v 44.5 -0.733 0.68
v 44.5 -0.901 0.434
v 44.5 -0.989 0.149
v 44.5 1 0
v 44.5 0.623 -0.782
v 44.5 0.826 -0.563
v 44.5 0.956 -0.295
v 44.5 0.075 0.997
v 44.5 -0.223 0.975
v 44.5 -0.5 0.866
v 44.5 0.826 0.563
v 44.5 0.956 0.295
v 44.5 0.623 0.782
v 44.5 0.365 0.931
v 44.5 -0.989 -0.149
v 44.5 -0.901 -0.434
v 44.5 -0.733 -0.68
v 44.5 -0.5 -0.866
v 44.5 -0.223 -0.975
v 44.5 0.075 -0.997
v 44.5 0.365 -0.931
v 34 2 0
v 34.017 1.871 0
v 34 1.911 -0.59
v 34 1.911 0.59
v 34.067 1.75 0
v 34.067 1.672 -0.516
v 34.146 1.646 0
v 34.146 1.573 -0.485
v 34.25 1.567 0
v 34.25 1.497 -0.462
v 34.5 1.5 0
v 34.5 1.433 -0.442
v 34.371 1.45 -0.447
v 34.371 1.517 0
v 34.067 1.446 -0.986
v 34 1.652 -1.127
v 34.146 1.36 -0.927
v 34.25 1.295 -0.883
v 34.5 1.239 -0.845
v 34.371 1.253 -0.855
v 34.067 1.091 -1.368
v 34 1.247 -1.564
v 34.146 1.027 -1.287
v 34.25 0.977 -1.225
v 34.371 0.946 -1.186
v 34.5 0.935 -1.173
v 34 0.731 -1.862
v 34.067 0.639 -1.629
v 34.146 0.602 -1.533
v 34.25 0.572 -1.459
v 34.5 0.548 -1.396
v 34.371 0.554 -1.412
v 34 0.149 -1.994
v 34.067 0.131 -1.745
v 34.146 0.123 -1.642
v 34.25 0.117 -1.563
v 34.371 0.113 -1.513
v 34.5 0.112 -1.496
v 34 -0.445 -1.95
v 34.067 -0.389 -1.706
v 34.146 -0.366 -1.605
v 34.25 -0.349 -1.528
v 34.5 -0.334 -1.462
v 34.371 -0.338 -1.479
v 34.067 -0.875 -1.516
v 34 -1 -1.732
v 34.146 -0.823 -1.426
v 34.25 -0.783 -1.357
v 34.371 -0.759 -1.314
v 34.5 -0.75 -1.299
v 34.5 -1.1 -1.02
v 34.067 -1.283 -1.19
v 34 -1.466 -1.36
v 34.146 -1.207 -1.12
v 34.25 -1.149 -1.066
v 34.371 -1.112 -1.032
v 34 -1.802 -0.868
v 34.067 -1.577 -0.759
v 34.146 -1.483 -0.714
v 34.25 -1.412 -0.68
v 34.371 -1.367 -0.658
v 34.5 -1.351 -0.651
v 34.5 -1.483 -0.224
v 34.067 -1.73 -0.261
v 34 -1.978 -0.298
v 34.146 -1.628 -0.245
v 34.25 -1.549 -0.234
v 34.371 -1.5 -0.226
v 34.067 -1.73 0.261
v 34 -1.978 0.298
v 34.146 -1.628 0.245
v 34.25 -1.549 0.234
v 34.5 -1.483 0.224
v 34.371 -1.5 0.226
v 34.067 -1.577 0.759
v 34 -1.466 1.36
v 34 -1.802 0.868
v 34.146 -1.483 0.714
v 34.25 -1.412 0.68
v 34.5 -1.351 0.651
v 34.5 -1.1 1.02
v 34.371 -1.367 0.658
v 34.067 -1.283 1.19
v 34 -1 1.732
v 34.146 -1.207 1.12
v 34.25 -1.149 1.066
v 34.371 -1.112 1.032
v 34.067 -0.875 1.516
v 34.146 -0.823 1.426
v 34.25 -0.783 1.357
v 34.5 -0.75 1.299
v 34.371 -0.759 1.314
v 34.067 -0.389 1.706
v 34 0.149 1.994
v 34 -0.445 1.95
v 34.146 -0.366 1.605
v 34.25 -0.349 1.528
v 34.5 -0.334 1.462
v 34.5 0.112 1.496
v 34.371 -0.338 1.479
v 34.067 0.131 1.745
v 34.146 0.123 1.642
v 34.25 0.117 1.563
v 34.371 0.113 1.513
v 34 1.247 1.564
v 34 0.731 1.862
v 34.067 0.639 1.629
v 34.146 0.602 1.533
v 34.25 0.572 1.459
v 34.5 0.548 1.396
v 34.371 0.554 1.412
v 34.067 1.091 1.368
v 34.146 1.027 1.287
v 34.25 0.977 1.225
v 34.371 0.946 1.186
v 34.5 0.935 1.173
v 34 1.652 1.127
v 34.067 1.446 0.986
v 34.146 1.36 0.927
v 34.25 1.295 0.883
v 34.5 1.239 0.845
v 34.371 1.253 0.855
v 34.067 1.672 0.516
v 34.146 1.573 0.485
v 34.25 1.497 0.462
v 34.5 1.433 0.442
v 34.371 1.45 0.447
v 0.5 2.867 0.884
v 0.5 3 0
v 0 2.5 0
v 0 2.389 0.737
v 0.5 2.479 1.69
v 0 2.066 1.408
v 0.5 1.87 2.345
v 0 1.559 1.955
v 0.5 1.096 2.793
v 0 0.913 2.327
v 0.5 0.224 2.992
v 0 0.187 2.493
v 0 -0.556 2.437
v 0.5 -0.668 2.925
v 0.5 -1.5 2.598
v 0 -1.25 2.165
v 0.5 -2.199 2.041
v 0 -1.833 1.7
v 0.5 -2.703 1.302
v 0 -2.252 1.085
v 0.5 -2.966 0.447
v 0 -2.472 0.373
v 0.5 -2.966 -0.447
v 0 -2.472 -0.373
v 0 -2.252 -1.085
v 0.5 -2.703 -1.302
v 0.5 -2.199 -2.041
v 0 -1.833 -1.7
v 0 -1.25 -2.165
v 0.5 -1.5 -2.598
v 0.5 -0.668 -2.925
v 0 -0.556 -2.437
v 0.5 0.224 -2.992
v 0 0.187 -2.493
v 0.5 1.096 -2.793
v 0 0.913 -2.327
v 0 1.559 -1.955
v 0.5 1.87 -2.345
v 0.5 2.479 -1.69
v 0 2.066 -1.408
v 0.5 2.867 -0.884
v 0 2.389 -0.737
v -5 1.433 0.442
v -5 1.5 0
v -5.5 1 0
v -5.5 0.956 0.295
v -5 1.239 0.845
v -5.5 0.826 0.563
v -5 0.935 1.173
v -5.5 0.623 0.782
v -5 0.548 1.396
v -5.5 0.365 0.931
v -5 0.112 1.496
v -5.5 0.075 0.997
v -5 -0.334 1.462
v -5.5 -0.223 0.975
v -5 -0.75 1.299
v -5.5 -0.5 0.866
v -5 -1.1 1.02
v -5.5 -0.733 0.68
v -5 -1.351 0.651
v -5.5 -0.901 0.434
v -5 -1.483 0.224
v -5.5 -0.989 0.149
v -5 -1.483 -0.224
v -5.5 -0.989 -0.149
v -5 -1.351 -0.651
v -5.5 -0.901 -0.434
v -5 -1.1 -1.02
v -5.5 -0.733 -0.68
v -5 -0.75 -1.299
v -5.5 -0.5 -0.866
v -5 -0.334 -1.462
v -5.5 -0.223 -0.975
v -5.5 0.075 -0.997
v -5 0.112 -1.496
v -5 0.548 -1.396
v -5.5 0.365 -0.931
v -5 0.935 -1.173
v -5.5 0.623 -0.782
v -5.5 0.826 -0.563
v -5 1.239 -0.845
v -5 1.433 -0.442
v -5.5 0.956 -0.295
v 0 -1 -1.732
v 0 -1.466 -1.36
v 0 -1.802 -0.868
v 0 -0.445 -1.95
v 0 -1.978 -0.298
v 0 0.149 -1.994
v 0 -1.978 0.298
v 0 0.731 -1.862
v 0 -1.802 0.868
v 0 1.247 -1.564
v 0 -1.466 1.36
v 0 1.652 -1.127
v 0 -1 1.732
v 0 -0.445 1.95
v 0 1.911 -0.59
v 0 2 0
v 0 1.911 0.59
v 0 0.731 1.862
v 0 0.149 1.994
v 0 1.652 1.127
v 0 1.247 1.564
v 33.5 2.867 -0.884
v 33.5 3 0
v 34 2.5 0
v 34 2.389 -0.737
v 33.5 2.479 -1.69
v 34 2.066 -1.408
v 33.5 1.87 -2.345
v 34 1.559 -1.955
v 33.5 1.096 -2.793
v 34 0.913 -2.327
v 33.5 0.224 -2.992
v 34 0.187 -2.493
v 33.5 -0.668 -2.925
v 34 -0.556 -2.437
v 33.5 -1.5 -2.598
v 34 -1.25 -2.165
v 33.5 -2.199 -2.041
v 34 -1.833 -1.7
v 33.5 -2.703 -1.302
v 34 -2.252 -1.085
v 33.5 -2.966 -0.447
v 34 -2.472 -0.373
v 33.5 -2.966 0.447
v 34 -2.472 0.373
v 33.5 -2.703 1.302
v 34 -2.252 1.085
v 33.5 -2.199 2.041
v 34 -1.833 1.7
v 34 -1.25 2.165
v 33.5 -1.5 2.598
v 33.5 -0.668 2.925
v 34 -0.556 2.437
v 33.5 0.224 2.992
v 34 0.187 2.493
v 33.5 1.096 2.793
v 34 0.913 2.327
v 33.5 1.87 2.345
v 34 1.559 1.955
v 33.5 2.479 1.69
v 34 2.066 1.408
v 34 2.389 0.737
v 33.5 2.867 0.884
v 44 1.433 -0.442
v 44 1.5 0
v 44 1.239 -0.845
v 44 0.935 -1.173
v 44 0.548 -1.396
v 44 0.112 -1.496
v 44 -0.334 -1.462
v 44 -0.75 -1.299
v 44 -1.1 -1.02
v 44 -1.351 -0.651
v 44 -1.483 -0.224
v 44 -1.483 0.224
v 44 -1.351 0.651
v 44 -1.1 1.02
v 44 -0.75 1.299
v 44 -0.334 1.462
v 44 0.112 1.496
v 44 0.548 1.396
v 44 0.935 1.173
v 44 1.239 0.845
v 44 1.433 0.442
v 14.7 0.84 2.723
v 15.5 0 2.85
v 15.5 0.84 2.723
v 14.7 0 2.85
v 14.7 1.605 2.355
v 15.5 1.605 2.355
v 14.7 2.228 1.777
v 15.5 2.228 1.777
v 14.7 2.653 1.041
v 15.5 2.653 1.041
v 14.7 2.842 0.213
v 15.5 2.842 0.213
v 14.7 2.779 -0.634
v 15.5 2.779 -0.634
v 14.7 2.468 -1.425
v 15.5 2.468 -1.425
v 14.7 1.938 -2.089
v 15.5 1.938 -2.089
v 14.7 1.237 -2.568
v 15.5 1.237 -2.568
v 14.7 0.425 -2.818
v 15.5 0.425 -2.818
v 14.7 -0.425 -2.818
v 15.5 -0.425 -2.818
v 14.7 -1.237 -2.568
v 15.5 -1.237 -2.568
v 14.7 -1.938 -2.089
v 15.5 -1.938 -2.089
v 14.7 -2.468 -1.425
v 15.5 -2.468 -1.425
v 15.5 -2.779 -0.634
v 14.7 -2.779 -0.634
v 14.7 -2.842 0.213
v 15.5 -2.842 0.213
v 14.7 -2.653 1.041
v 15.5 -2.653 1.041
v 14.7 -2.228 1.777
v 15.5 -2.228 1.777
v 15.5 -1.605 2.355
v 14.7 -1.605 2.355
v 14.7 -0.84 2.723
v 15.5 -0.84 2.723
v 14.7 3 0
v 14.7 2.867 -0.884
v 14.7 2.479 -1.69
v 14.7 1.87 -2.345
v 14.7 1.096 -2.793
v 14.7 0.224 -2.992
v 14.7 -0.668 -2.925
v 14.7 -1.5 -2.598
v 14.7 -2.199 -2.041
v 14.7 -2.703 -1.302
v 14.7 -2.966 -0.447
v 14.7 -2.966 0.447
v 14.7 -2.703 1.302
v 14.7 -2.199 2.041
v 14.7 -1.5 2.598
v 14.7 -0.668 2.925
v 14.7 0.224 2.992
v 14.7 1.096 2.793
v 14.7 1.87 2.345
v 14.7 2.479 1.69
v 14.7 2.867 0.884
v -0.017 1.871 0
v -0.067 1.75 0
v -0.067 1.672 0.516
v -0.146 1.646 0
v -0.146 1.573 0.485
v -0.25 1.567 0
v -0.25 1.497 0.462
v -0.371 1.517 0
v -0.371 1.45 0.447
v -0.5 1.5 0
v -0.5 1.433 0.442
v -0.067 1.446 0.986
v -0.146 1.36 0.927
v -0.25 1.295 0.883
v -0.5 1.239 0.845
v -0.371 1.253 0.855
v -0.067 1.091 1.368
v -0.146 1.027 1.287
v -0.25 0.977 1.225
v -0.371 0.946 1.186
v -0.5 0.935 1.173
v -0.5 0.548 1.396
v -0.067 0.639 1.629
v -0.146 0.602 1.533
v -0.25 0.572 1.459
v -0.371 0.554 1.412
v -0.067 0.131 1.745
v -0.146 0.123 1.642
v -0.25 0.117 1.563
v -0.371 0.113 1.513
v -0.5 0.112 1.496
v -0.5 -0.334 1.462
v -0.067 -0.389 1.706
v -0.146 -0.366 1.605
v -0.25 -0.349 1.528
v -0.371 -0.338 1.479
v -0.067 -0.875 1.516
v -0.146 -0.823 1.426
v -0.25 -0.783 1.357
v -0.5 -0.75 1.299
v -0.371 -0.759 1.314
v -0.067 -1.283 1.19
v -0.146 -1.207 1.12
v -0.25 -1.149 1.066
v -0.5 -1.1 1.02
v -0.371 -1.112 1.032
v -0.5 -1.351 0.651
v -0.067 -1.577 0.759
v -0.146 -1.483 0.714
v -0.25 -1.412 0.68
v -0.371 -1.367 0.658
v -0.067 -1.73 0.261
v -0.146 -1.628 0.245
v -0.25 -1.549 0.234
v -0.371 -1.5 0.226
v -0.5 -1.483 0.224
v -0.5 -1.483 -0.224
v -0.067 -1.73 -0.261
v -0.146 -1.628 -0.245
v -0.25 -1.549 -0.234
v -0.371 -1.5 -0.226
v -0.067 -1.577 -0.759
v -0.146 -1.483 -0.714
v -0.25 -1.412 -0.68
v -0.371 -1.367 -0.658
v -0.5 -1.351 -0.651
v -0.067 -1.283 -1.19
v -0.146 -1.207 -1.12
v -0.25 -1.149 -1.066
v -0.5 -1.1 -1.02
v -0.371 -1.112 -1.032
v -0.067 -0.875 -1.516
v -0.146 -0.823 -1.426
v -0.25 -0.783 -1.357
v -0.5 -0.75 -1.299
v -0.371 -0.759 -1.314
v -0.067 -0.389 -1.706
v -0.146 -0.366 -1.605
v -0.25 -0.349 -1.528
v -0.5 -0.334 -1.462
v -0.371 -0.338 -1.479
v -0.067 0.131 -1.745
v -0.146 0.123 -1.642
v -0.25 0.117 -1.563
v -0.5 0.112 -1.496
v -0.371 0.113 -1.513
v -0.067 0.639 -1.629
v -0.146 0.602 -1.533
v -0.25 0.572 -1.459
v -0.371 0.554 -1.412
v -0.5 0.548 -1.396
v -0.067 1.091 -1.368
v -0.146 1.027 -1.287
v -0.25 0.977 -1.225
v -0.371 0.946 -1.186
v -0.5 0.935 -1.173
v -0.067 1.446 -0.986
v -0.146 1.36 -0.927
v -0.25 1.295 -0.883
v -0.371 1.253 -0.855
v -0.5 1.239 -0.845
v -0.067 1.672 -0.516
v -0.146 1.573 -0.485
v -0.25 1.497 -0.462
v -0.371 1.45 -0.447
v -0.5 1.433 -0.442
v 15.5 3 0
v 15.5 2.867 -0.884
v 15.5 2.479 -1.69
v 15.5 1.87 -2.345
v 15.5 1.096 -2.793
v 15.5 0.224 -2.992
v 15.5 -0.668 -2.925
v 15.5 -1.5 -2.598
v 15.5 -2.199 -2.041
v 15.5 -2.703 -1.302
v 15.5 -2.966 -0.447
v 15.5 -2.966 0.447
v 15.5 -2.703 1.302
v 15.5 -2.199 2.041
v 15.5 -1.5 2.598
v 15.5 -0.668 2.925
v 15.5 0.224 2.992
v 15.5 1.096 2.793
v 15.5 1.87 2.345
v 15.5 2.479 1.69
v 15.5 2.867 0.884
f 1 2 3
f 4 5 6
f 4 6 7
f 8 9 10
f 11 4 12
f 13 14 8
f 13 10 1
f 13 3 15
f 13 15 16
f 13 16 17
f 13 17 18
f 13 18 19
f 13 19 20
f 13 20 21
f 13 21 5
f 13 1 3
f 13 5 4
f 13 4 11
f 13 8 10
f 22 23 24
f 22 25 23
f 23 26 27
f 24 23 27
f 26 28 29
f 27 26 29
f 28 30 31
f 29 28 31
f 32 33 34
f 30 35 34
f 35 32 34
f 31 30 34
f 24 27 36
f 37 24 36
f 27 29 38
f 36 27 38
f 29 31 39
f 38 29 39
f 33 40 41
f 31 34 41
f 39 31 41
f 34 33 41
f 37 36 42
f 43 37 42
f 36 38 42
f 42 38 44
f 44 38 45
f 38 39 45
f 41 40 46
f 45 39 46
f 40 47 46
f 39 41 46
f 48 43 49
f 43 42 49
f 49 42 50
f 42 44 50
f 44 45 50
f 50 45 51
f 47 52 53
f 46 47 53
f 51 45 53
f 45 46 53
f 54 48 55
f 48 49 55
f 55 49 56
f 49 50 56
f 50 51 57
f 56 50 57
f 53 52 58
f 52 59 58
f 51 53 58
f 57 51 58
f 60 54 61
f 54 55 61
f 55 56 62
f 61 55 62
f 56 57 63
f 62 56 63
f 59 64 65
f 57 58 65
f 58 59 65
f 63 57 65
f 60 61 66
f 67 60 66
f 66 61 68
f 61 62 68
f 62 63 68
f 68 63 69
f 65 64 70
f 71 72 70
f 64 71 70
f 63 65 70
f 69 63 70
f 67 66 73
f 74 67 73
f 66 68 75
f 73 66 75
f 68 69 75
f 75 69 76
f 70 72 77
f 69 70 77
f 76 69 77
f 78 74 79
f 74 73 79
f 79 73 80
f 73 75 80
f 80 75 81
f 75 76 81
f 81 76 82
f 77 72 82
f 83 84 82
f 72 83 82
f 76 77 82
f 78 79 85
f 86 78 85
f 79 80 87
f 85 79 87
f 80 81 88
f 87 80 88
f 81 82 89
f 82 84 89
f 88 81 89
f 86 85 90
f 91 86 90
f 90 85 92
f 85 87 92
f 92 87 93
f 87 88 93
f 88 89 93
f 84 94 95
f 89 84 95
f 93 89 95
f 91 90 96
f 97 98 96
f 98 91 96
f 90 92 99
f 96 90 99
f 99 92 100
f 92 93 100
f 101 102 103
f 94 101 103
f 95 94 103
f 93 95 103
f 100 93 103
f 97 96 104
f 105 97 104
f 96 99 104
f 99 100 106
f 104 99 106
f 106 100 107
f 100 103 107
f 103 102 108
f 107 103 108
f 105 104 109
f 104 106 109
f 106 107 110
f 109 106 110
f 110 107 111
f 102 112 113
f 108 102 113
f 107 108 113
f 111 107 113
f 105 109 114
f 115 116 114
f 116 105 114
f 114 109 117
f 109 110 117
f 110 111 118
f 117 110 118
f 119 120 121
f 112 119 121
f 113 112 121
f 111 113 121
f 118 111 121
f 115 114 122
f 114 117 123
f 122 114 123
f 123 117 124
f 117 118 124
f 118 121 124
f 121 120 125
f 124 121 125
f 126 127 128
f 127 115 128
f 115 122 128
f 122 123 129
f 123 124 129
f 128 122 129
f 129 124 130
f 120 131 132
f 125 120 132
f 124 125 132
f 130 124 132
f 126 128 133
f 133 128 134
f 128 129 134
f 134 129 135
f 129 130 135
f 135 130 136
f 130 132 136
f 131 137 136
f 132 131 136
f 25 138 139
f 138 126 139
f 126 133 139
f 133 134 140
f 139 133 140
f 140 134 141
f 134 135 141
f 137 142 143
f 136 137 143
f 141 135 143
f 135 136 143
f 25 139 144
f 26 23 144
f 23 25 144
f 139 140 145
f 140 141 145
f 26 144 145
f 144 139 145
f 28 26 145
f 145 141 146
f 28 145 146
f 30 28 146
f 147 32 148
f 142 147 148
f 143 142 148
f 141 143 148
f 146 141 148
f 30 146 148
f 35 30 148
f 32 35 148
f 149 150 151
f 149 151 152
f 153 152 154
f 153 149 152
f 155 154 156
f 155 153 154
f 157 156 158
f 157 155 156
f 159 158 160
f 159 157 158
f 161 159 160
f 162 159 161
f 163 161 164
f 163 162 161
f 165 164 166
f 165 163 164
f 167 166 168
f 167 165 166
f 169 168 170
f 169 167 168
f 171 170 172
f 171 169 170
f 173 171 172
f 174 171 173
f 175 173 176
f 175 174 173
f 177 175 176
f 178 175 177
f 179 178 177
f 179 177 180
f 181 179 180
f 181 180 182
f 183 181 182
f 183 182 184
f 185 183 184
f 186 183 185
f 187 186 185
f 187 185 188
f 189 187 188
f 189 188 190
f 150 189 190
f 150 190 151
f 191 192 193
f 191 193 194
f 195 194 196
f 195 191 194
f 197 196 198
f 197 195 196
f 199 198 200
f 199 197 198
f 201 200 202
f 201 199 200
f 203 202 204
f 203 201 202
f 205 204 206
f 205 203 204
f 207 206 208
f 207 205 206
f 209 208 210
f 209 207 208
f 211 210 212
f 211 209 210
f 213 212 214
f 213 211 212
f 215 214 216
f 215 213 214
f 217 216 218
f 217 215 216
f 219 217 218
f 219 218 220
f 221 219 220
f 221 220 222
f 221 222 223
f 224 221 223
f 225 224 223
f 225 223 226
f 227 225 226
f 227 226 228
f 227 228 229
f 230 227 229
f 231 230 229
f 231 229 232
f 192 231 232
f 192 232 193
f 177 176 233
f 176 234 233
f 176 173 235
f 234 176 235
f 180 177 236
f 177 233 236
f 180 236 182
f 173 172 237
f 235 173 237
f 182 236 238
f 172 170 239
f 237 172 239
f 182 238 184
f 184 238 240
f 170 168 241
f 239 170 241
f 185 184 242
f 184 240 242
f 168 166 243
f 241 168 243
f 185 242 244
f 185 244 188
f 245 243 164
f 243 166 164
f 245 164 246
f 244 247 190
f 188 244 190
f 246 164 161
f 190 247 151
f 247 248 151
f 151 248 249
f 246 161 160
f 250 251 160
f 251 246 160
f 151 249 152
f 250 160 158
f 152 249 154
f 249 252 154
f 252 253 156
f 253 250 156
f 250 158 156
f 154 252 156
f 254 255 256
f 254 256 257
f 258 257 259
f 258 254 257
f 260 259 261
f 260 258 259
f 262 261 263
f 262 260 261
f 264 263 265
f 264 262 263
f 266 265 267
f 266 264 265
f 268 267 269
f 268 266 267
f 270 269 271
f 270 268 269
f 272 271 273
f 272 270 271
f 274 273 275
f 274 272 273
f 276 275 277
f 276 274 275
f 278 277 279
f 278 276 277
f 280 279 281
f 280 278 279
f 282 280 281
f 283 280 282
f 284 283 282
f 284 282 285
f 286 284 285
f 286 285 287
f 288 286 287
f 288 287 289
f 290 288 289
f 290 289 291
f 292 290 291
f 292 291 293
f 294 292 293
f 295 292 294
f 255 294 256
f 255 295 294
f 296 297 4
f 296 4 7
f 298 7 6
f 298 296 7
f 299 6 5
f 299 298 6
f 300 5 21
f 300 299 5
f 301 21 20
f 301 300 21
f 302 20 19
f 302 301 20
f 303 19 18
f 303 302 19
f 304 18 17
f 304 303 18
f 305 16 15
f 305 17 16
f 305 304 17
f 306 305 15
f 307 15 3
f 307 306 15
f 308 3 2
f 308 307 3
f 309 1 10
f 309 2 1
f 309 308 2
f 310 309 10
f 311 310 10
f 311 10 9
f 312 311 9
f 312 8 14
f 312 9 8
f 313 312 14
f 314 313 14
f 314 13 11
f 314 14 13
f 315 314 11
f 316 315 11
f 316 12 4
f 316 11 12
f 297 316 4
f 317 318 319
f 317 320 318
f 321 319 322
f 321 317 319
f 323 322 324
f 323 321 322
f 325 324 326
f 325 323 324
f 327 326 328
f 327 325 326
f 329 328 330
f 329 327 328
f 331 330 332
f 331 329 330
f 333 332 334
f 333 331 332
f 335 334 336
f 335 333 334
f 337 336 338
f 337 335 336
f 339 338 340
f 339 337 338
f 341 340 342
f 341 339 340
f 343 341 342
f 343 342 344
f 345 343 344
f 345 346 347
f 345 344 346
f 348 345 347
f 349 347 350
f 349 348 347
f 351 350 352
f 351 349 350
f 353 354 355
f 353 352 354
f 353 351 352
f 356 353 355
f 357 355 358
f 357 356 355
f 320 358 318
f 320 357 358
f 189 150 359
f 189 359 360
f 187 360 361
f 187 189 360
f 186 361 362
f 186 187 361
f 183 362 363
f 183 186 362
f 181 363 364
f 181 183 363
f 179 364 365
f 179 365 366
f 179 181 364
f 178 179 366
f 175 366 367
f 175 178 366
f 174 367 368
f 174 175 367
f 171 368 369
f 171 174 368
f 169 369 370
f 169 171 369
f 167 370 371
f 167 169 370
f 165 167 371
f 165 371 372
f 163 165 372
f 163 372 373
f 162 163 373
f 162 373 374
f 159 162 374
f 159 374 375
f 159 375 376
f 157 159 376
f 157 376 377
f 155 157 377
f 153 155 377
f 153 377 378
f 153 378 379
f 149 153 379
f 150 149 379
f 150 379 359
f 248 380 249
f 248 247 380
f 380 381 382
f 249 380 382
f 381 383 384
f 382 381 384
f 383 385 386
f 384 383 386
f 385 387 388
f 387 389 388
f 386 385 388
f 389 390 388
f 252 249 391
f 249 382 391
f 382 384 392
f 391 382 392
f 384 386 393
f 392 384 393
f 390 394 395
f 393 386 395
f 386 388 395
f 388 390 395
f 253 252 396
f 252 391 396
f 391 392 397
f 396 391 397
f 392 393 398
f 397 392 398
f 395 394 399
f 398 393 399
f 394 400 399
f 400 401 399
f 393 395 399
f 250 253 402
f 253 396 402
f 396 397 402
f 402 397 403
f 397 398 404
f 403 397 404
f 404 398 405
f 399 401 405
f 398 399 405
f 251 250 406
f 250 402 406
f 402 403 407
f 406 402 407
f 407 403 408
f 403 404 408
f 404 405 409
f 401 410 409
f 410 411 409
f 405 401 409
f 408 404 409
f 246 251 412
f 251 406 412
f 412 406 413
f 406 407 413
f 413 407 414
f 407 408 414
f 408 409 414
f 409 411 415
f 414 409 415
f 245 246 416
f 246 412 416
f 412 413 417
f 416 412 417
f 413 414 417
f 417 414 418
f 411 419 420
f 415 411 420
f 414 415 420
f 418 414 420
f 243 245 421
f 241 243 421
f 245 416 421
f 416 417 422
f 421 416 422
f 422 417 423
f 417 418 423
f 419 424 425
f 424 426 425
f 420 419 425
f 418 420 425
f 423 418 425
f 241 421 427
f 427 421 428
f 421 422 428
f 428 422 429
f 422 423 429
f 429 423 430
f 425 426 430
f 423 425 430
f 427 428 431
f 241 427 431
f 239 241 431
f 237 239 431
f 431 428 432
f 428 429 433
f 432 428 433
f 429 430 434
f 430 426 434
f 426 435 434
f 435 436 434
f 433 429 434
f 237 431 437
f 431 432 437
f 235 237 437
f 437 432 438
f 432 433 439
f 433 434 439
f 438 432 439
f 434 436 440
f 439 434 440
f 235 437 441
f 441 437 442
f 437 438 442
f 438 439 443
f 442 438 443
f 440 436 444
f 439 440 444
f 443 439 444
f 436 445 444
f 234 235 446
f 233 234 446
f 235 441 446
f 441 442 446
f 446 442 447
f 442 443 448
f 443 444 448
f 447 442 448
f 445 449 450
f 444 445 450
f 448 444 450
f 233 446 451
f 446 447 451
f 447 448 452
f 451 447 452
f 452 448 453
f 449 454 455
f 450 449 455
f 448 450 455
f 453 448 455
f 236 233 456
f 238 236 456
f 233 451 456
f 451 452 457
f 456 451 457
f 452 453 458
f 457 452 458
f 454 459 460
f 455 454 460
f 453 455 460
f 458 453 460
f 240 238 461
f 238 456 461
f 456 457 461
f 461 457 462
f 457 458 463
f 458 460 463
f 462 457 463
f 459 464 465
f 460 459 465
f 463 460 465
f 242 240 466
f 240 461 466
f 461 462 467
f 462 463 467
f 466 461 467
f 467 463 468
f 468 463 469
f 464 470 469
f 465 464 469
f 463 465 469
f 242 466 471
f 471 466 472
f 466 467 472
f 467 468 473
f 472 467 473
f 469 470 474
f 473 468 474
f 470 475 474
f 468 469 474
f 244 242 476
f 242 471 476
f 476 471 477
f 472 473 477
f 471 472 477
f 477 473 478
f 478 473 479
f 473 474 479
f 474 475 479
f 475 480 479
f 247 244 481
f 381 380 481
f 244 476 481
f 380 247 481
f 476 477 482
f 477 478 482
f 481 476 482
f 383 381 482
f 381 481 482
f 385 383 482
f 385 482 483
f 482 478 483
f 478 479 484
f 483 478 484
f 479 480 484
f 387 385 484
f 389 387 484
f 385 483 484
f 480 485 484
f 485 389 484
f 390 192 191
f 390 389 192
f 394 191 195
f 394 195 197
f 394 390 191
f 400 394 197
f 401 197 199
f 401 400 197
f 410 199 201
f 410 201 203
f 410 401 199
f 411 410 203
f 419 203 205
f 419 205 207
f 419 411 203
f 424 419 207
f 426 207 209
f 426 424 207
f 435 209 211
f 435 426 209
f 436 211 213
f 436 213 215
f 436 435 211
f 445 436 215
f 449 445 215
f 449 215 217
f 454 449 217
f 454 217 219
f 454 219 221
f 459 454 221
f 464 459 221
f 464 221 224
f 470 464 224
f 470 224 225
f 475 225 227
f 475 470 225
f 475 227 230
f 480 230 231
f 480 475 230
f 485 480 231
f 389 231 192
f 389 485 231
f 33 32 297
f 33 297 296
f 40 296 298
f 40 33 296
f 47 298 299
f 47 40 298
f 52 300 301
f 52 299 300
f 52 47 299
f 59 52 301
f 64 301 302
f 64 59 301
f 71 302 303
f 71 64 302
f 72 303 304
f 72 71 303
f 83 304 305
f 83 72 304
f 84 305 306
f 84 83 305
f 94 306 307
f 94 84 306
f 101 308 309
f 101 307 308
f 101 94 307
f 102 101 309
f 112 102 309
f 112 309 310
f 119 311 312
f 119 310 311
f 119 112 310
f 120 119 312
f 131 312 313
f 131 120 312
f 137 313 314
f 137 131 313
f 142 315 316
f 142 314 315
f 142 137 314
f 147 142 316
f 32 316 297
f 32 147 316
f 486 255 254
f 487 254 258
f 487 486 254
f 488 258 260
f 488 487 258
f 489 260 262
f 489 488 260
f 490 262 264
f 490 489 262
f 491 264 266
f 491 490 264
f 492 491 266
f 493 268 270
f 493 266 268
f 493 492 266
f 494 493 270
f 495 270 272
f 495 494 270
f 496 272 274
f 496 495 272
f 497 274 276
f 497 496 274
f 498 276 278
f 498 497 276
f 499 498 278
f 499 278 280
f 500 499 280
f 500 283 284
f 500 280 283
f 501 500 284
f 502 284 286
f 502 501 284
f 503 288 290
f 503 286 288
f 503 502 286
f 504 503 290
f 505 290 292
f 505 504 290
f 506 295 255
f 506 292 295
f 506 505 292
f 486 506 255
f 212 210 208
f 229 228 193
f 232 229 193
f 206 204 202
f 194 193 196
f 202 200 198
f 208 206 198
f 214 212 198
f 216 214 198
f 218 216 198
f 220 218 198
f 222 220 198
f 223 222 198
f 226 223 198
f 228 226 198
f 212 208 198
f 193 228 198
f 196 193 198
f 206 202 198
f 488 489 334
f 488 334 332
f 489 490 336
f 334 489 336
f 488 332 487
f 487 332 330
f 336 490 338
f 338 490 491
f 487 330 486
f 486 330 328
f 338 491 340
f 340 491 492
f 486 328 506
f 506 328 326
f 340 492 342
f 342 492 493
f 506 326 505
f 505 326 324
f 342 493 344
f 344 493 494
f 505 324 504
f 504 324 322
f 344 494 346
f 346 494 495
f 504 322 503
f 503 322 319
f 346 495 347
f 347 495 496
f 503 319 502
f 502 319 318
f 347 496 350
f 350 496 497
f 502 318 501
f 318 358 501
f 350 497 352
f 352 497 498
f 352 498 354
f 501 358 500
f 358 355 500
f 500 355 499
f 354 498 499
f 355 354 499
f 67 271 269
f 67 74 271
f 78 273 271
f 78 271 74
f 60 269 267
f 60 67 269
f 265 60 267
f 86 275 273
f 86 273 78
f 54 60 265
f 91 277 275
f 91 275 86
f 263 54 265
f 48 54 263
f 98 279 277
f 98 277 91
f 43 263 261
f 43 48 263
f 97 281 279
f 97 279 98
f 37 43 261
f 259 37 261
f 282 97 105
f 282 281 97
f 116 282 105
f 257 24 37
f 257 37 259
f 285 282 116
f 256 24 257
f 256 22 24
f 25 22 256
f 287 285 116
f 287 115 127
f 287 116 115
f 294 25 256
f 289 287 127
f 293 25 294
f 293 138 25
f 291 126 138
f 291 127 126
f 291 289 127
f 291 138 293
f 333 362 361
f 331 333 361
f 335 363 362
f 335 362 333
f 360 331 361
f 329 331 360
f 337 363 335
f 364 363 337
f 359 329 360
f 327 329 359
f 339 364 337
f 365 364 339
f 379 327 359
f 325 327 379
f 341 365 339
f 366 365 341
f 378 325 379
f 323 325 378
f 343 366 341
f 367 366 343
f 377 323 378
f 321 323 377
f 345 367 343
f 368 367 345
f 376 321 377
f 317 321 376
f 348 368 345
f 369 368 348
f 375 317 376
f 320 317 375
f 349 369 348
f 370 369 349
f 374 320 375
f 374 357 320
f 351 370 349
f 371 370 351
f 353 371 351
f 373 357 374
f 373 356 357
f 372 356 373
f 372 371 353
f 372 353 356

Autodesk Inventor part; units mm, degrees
ref_plane "YZ Plane" through (0, 0, 0) normal (1, 0, 0) x (0, 1, 0)
ref_plane "XZ Plane" through (0, 0, 0) normal (0, 1, 0) x (-1, 0, 0)
ref_plane "XY Plane" through (0, 0, 0) normal (0, 0, 1) x (1, 0, 0)
sketch "Sketch1" plane through (0, 0, 0) normal (0, 0, 1) x (1, 0, 0)
  line L0 (0, 0) -> (34, 0)
  line L1 (34, 0) -> (34, 3)
  line L2 (34, 3) -> (0, 3)
  line L3 (0, 3) -> (0, 0)
  line L4 (0, 0) -> (-5.5, 0)
  line L5 (-5.5, 0) -> (-5.5, 1.5)
  line L6 (-5.5, 1.5) -> (0, 1.5)
  line L7 (0, 1.5) -> (0, 0)
  line L8 (34, 0) -> (44.5, 0)
  line L9 (44.5, 0) -> (44.5, 1.5)
  line L10 (44.5, 1.5) -> (34, 1.5)
  line L11 (34, 1.5) -> (34, 0)
  dimension "d0" = 3
  dimension "d1" = 34
  dimension "d2" = 1.5
  dimension "d3" = 5.5
  dimension "d4" = 1.5
  dimension "d5" = 10.5
revolve "Revolution1" add sketch "Sketch1" angle 360 about axis through (0, 0, 0) along (1, 0, 0)
fillet "Fillet1" radius 0.5 2 edges at (34, -1.5, 0) (0, -1.5, 0)
chamfer "Chamfer1" distance 0.5 angle 45 4 edges at (-5.5, -1.5, 0) (0, -3, 0) (34, -3, 0) (44.5, -1.5, 0)
sketch "Sketch2" plane through (0, 0, 0) normal (0, 1, 0) x (-1, 0, 0)
  line L0 (-14.7, 3) -> (-15.5, 3)
  line L1 (-15.5, 3) -> (-15.5, 2.85)
  line L2 (-15.5, 2.85) -> (-14.7, 2.85)
  line L3 (-14.7, 2.85) -> (-14.7, 3)
  line L4 (-0.5, -3) -> (-0.5, 3) projected
  line L5 (-33.5, 3) -> (-33.5, -3) projected
  line L6 (15.5, 0) -> (-54.5, 0) projected
  line L7 (0, 2.5) -> (0, -2.5) projected
  point P0 (0, 0)
  dimension "d11" = 2.85
  dimension "d12" = 0.8
  dimension "d13" = 15.5
revolve "Revolution2" cut sketch "Sketch2" angle 360 about axis through (-10, 0, 0) along (1, 0, 0)
equation "\"d4\" = d2"
properties part number "Pancake_Reverse Shaft" material "Aluminum 6061"
